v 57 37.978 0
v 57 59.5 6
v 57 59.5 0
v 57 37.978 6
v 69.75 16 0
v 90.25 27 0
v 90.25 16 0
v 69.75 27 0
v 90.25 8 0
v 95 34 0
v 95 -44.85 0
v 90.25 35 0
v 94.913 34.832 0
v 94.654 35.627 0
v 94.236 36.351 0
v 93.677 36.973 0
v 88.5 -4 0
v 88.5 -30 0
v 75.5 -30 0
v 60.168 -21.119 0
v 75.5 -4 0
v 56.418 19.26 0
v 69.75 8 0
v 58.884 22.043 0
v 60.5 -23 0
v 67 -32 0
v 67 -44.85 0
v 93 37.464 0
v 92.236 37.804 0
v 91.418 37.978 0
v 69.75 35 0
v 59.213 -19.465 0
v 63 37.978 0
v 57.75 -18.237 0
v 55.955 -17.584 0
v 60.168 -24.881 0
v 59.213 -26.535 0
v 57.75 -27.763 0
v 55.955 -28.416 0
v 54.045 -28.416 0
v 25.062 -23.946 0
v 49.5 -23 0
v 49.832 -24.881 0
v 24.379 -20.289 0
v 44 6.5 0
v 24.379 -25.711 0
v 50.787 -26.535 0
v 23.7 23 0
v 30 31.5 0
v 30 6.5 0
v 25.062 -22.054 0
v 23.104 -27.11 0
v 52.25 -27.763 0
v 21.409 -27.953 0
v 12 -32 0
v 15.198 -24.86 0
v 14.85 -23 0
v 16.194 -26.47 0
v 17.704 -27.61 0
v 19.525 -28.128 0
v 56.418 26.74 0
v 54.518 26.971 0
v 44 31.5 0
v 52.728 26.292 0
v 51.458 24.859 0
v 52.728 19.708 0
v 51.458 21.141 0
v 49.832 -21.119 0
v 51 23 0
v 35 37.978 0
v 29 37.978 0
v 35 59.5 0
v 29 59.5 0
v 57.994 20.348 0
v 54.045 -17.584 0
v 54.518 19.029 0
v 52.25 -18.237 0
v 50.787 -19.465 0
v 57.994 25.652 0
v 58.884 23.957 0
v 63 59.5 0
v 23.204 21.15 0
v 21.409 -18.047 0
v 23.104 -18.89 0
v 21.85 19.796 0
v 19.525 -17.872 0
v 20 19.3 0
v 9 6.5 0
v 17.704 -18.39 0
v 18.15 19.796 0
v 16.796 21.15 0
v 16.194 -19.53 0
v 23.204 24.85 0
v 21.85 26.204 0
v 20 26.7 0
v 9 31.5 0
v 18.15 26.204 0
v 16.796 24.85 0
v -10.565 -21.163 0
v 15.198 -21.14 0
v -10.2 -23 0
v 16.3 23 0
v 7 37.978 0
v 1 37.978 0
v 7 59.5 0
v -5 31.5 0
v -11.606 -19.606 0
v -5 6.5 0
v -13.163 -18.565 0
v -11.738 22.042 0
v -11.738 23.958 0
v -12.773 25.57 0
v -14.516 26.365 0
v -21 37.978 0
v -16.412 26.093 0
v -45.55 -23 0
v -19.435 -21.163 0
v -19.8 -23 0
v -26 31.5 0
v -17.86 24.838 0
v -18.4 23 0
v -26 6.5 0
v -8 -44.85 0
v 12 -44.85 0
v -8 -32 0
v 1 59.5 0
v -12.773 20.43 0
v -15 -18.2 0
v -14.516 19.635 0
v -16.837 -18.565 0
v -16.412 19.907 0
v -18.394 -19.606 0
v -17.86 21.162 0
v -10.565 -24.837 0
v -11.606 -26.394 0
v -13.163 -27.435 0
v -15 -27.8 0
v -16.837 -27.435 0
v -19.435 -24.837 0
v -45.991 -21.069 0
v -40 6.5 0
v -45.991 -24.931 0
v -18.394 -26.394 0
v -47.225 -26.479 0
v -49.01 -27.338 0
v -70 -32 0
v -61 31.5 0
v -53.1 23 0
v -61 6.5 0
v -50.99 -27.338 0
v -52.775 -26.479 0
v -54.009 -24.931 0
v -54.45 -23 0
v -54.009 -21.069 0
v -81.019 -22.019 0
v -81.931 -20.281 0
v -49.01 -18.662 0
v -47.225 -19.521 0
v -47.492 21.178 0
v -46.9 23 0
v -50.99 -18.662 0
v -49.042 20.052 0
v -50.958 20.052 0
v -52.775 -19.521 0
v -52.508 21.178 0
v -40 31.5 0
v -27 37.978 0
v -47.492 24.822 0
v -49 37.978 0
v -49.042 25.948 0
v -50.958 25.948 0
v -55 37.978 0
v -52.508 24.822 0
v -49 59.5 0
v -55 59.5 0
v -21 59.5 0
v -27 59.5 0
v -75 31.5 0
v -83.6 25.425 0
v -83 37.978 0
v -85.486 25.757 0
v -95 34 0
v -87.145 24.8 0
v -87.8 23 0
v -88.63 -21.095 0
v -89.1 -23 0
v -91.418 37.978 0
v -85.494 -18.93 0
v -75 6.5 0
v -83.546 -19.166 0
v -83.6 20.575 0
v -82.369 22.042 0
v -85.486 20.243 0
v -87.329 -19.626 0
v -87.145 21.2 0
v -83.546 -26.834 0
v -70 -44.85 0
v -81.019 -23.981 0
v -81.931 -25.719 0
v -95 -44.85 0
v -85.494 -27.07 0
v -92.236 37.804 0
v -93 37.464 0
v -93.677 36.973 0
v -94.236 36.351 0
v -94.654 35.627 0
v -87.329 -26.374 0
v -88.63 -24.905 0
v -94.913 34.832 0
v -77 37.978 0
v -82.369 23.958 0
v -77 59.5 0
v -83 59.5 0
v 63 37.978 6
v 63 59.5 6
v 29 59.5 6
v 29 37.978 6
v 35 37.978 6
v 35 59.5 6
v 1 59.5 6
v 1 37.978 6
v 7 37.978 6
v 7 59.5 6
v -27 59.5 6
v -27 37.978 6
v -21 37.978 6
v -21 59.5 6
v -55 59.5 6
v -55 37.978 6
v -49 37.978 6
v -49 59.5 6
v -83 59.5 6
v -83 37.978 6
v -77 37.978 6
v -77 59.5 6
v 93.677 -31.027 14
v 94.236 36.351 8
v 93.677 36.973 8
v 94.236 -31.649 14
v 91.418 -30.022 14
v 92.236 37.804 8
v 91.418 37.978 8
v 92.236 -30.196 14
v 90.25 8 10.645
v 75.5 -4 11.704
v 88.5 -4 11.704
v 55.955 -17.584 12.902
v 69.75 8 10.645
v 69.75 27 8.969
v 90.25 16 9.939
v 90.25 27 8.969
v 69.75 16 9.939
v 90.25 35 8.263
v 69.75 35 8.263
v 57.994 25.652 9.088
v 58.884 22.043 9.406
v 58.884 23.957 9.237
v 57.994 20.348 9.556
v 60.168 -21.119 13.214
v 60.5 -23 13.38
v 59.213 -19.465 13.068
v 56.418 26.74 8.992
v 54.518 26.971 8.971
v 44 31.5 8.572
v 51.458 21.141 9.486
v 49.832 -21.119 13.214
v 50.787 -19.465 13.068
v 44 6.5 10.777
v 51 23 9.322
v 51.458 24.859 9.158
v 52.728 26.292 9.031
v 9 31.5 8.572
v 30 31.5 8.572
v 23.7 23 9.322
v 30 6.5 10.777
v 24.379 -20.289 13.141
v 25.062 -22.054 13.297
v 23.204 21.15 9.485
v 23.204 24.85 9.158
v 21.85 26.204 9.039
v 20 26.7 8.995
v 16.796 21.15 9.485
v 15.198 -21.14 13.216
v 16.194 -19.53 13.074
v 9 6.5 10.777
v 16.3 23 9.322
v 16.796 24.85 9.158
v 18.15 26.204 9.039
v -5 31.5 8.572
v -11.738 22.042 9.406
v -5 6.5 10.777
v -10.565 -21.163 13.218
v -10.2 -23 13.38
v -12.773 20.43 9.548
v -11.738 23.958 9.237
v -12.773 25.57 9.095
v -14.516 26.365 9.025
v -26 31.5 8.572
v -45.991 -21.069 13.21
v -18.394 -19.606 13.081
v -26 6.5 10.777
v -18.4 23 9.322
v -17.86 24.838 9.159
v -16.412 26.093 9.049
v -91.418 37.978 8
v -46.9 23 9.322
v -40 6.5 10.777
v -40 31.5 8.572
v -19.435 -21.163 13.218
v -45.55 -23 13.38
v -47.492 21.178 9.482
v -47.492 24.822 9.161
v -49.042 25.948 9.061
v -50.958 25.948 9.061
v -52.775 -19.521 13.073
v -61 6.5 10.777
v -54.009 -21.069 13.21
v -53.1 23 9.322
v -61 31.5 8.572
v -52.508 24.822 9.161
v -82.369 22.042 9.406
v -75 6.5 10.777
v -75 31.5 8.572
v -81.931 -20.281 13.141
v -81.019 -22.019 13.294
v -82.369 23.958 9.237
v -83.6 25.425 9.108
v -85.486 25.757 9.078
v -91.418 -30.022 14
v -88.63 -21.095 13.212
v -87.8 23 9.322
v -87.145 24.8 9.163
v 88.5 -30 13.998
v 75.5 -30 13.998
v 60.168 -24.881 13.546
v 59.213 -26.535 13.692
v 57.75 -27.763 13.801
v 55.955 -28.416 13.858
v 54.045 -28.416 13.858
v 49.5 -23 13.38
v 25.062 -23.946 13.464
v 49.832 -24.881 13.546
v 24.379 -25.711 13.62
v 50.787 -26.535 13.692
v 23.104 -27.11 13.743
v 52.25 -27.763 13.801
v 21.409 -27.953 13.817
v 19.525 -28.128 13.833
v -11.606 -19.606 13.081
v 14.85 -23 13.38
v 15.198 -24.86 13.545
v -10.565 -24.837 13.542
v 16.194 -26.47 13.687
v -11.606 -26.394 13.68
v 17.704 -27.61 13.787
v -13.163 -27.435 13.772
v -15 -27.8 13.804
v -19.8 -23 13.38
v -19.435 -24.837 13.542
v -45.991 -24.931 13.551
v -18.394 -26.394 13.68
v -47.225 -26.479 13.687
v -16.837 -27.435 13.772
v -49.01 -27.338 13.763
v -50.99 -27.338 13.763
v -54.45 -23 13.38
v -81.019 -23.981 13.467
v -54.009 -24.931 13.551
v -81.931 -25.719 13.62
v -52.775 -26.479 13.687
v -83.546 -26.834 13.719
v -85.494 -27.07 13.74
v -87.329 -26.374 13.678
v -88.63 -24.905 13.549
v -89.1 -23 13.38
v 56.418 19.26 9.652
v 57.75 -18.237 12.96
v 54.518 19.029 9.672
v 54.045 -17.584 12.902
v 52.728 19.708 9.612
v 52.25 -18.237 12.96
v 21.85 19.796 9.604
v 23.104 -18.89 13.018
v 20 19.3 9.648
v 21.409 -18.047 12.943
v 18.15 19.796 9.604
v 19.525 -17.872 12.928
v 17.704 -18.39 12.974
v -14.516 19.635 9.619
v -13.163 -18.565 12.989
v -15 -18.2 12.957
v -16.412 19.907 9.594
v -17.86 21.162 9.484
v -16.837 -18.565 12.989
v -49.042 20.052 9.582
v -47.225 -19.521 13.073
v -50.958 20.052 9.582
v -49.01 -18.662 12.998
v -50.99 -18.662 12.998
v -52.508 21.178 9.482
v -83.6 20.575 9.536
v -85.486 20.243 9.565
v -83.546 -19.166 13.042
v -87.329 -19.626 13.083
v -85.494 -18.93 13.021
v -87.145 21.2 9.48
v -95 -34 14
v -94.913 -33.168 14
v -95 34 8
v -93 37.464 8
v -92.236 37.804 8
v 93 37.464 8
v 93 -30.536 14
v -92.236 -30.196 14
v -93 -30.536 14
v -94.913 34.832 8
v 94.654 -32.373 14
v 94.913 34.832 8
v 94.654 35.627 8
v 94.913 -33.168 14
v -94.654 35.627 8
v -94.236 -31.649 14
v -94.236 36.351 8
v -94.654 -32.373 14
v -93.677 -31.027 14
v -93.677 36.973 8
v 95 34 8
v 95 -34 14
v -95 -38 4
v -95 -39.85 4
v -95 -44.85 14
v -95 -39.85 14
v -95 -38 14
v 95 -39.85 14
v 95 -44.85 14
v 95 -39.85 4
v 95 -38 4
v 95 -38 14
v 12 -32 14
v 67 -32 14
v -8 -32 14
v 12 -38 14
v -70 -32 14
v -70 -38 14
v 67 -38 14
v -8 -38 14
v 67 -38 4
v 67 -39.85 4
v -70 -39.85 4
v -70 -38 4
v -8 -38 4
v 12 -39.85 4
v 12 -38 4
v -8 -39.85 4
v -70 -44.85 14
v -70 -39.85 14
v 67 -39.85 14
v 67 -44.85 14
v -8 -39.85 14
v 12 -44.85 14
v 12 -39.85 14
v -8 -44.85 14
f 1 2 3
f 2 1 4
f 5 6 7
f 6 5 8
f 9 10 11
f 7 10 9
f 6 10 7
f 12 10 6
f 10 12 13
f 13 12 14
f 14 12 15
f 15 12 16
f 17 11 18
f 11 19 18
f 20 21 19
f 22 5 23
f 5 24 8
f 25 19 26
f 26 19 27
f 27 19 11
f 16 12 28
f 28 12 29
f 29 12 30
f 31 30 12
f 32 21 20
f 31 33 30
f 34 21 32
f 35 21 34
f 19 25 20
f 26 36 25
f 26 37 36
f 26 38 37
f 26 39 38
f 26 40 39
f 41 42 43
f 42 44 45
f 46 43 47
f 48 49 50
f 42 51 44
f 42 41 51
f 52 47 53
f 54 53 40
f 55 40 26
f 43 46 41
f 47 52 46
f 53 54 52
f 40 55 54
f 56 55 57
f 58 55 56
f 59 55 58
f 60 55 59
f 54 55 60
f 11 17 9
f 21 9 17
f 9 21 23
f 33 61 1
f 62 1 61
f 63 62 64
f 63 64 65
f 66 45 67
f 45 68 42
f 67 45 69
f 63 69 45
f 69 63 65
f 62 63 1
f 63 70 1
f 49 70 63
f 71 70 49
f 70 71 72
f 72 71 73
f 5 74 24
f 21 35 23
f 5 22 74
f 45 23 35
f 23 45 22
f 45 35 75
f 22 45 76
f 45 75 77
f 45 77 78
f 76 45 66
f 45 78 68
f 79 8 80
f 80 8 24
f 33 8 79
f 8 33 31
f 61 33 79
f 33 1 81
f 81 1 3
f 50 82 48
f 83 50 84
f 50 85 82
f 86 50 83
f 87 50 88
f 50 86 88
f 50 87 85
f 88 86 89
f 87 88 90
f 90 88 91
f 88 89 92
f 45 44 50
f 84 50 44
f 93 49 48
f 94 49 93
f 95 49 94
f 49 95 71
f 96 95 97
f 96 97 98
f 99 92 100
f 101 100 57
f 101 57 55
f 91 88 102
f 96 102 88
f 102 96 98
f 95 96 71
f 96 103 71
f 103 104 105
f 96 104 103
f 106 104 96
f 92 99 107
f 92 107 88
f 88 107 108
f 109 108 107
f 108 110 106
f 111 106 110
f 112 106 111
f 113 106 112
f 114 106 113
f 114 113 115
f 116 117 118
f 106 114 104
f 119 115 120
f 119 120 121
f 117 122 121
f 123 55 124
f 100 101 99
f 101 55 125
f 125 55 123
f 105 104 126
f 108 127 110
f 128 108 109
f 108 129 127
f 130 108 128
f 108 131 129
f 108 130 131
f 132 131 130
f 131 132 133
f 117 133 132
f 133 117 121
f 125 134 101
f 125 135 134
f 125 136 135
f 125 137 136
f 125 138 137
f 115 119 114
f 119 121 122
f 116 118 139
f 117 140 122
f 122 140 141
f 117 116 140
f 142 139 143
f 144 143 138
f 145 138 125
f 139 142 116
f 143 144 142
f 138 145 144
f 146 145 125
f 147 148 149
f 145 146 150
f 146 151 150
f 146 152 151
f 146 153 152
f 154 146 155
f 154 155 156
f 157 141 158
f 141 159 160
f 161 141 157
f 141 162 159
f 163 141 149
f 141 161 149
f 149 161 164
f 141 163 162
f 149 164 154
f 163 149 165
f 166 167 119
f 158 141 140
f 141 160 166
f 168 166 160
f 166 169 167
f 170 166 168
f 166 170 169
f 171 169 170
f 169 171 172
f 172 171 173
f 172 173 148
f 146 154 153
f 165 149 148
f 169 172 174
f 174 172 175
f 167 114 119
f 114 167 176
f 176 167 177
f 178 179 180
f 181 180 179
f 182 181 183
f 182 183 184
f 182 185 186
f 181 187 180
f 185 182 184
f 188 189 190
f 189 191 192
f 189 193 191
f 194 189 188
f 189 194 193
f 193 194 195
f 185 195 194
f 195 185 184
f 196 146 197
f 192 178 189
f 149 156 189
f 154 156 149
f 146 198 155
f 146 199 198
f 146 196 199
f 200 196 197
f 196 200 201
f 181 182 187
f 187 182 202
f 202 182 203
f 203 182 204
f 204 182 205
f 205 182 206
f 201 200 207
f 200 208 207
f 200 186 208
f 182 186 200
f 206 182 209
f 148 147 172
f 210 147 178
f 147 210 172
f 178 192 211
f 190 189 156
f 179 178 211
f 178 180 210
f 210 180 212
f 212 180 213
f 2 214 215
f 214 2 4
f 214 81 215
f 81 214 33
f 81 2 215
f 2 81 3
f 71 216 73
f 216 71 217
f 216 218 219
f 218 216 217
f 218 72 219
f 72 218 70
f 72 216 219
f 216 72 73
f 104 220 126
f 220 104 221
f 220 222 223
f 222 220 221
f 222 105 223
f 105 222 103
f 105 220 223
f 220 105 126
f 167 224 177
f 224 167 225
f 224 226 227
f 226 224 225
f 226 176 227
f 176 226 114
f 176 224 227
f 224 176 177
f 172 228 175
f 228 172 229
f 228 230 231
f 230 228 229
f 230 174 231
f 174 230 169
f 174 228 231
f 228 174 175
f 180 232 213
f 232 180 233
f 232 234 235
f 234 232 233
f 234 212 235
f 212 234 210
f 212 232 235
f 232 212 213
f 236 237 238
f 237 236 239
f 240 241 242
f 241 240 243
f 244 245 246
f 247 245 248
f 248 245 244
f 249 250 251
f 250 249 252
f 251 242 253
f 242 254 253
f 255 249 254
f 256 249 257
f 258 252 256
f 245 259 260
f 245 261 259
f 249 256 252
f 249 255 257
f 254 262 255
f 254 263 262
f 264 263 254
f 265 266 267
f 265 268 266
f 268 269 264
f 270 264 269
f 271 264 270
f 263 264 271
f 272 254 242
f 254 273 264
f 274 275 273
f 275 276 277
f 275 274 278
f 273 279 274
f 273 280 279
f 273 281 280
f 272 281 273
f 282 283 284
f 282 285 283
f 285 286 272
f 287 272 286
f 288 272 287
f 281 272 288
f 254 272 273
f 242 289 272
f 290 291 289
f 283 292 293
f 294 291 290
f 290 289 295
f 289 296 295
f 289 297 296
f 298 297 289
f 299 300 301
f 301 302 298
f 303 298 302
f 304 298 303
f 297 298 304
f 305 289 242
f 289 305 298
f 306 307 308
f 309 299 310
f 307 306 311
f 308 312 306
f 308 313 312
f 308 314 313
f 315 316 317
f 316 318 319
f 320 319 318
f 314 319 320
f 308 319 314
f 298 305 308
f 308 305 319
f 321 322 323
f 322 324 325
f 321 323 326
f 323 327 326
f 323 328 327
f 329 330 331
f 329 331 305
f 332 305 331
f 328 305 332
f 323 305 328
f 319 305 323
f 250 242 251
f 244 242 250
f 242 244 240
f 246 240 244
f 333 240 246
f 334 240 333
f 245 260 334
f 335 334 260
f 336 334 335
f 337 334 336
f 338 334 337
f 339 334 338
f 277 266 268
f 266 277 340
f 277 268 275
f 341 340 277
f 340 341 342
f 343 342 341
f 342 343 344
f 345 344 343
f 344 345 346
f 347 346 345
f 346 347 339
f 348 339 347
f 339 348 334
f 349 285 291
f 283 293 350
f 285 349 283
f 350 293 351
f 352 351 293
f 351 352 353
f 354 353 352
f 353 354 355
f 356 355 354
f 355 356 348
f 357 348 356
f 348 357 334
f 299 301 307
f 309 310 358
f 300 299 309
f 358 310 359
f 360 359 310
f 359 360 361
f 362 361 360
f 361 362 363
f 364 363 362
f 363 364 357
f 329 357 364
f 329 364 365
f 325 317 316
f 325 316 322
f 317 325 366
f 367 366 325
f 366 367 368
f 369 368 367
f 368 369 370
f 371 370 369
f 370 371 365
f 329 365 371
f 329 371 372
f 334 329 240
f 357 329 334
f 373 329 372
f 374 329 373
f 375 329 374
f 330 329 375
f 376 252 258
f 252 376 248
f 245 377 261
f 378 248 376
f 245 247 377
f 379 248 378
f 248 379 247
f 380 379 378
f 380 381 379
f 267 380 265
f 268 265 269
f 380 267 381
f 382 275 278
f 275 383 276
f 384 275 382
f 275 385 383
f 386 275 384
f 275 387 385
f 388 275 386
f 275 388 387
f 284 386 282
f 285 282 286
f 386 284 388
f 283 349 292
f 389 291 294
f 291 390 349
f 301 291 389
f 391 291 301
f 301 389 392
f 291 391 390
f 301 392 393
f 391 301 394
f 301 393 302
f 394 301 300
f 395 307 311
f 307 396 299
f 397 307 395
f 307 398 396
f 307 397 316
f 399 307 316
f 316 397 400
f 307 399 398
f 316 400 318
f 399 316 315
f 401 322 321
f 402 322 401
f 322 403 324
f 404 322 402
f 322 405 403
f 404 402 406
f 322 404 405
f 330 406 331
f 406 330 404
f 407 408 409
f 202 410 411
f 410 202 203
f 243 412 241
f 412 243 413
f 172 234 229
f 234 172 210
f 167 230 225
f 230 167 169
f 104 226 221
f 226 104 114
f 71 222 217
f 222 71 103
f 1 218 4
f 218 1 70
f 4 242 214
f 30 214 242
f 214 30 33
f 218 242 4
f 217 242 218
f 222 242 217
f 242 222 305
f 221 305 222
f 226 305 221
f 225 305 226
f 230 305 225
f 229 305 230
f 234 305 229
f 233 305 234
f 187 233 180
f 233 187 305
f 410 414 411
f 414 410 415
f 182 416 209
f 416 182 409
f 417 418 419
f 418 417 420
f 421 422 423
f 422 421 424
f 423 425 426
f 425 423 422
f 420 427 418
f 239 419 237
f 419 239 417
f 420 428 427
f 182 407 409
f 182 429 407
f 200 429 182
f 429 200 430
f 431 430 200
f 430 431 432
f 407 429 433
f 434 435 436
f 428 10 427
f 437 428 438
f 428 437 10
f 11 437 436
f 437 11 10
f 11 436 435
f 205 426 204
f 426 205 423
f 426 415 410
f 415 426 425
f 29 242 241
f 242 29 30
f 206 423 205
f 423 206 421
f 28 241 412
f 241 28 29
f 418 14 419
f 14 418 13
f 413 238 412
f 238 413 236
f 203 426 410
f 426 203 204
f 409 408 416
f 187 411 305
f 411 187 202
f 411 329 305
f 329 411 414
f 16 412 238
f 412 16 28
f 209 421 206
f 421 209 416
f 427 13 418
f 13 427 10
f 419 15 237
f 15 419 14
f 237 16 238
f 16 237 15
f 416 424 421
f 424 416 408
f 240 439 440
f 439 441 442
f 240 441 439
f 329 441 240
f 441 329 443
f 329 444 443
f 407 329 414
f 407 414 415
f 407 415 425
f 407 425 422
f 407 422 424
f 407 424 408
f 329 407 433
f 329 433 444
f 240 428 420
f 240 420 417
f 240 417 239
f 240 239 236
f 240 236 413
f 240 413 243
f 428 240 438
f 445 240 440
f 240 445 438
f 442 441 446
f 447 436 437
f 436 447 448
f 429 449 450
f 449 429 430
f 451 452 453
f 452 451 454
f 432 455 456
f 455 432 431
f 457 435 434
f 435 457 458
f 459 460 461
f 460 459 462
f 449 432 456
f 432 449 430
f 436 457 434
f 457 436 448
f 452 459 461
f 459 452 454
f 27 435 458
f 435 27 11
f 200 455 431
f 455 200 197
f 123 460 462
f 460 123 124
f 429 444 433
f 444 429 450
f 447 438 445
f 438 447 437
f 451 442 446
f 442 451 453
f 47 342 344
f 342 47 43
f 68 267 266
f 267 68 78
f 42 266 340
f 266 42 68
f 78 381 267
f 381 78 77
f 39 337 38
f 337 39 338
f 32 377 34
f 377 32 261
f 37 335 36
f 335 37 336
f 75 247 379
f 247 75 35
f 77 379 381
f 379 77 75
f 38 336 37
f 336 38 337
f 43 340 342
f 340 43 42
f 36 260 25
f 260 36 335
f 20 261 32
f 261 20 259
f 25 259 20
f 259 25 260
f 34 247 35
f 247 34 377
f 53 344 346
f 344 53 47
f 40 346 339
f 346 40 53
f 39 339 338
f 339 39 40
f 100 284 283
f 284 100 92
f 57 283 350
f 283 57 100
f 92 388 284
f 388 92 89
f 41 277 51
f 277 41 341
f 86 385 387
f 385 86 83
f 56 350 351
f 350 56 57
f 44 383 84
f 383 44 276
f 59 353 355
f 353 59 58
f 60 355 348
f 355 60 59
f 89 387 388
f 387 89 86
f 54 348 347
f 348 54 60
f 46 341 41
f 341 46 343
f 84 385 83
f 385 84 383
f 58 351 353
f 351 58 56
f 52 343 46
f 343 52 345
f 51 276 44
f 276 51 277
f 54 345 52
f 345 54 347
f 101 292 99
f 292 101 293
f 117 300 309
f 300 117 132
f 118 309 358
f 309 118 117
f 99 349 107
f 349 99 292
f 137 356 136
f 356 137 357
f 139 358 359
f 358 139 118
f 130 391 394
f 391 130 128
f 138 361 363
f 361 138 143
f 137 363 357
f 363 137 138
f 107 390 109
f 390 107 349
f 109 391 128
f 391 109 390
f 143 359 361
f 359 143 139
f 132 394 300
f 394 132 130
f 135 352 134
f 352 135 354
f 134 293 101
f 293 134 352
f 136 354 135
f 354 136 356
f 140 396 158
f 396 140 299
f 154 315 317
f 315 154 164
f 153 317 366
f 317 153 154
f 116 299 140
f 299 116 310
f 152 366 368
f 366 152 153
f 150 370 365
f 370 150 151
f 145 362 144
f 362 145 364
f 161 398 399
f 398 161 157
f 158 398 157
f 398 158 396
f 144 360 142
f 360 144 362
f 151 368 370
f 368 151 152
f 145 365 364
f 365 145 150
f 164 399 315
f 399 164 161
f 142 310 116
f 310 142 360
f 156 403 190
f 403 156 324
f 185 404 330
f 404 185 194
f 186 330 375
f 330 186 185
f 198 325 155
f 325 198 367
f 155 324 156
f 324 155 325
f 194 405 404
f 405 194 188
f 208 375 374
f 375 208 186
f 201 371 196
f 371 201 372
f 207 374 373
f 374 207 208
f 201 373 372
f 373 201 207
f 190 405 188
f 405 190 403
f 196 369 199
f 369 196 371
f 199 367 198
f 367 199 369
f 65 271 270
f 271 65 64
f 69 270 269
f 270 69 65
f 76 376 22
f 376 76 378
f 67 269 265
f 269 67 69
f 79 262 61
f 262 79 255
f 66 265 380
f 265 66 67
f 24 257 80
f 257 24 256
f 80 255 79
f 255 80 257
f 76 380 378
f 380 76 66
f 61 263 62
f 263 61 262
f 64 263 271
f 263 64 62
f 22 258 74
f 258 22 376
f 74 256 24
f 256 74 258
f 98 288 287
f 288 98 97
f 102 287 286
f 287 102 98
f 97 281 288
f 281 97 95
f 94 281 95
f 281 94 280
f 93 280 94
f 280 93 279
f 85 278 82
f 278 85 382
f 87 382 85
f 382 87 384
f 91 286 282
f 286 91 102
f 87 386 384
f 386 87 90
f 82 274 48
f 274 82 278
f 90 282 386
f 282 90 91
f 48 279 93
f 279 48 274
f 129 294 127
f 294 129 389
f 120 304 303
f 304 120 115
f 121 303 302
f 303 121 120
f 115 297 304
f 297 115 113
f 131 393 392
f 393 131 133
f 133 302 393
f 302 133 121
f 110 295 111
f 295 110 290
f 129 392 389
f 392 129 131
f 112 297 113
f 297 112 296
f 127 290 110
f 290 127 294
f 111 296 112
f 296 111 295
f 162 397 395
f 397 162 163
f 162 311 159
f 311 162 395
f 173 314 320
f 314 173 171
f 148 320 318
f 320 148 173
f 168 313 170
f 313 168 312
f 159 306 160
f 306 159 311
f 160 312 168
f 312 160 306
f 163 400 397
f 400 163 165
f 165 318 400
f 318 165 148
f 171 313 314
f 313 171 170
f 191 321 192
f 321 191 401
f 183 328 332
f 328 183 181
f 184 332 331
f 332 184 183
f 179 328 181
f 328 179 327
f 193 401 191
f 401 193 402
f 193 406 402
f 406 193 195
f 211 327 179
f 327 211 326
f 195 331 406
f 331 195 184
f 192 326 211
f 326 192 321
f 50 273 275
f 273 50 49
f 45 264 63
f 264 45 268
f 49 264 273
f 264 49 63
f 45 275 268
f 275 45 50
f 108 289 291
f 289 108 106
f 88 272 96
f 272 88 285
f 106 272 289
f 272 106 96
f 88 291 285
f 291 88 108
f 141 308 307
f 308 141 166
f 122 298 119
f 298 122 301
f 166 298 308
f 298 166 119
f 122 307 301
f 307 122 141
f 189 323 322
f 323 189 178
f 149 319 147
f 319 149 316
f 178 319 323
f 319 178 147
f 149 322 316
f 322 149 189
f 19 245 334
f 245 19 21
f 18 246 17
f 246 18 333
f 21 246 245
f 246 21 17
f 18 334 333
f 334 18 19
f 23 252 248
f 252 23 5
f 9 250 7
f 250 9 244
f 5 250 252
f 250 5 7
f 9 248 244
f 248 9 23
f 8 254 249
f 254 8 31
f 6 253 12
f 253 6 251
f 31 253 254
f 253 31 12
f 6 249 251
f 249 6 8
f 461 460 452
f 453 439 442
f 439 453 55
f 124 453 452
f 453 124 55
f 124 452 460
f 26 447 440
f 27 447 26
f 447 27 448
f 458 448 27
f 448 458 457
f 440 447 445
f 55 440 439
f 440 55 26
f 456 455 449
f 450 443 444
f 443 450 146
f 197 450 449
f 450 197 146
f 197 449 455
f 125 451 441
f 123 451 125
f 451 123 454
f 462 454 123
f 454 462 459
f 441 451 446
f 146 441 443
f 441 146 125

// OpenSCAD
Width=76;
Thickness=14;
Length=190;
Gap=1.5+0.35;

module holder() {
  difference() {
    union() {
      hull() {
        translate([-Length/2+4, -Width/2+4, 0])
          cylinder(r1=4, r2=4, h=Thickness, center=true, $fn=30);
        translate([-Length/2+4, +Width/2-4, (Thickness-8)/2])
          cylinder(r1=4, r2=4, h=8, center=true, $fn=30);
        translate([+Length/2-4,-Width/2+4, 0])
          cylinder(r1=4, r2=4, h=Thickness, center=true, $fn=30);
        translate([+Length/2-4, +Width/2-4, (Thickness-8)/2])
          cylinder(r1=4, r2=4, h=8, center=true, $fn=30);
      }
      
      // Bridge  
      translate([0, -Width/2-(Gap+5)/2+4, Thickness/2-4/2])
        cube([Length, (Gap+5), 4], center=true);
      
      // Latching part
      translate([0, -Width/2-5/2-(Gap), -14/2+Thickness/2])
        cube([Length, 5, 14], center=true);  

      translate([0, -Width/2+4/2, -14/2+Thickness/2])
        cube([Length, 4, 14], center=true);  
          
      for (i = [0 : 1 : 5])
        translate([-Length/2+35+i*28, Width/2+16/2-1, Thickness/2-6/2])
          cube([6, 16+13, 6], center=true);
      
    }
    // Holes
    union() {
      for (i = [0 : 1 : 4])
        translate([-Length/2+40+i*35, -Width/2+15, 0])
          cylinder(r1=(11-i*0.7)/2, r2=(11-i*0.7)/2, h=Thickness+1, center=true);
      for (i = [0 : 1 : 4])
        translate([-Length/2+40+i*35, Width/2-15, 0])
          cylinder(r1=(8-i*0.6)/2, r2=(8-i*0.6)/2, h=Thickness+1, center=true);      
      translate([-Length/2+13, -17, 0])
        cube([13, 26, Thickness+1], center=true);
      translate([-Length/2+15, -23+35, 0])
        cube([20.5, 8, Thickness+1], center=true);
      translate([-Length/2+15, -23+35+19, 0])
        cube([20.5, 8, Thickness+1], center=true);
      
//      for (i = [0 : 1 : 4])
//        translate([-Length/2+23+i*35, -Width/2+36, 0])
//          cube([25, 8, Thickness+1], center=true);
      for (i = [1 : 1 : 4])
        translate([-Length/2+23+i*35, -Width/2+57, 0])
          cube([14, 25, Thickness+1], center=true);
//      for (i = [1 : 1 : 4])
//        translate([-Length/2+23+i*35, +Width/2-57, 0])
//          cube([8, 20, Thickness+1], center=true);


      translate([-Length/2+28, -Width/2-16+6, -20])
        cube([55, 16, Thickness+20], center=false);

      translate([Length/2-20-67, -Width/2-16+6, -20])
        cube([62, 16, Thickness+20], center=false);

      
    }
  }
}

intersection() {
translate([0, 0, Thickness/2])  rotate([0, 180, 0]) 
    holder();
//  cube([300, 300, 0.6*2], center=true);
//translate([0, -39, 0])  { cube([10, 10, 100], center=true); }
}
